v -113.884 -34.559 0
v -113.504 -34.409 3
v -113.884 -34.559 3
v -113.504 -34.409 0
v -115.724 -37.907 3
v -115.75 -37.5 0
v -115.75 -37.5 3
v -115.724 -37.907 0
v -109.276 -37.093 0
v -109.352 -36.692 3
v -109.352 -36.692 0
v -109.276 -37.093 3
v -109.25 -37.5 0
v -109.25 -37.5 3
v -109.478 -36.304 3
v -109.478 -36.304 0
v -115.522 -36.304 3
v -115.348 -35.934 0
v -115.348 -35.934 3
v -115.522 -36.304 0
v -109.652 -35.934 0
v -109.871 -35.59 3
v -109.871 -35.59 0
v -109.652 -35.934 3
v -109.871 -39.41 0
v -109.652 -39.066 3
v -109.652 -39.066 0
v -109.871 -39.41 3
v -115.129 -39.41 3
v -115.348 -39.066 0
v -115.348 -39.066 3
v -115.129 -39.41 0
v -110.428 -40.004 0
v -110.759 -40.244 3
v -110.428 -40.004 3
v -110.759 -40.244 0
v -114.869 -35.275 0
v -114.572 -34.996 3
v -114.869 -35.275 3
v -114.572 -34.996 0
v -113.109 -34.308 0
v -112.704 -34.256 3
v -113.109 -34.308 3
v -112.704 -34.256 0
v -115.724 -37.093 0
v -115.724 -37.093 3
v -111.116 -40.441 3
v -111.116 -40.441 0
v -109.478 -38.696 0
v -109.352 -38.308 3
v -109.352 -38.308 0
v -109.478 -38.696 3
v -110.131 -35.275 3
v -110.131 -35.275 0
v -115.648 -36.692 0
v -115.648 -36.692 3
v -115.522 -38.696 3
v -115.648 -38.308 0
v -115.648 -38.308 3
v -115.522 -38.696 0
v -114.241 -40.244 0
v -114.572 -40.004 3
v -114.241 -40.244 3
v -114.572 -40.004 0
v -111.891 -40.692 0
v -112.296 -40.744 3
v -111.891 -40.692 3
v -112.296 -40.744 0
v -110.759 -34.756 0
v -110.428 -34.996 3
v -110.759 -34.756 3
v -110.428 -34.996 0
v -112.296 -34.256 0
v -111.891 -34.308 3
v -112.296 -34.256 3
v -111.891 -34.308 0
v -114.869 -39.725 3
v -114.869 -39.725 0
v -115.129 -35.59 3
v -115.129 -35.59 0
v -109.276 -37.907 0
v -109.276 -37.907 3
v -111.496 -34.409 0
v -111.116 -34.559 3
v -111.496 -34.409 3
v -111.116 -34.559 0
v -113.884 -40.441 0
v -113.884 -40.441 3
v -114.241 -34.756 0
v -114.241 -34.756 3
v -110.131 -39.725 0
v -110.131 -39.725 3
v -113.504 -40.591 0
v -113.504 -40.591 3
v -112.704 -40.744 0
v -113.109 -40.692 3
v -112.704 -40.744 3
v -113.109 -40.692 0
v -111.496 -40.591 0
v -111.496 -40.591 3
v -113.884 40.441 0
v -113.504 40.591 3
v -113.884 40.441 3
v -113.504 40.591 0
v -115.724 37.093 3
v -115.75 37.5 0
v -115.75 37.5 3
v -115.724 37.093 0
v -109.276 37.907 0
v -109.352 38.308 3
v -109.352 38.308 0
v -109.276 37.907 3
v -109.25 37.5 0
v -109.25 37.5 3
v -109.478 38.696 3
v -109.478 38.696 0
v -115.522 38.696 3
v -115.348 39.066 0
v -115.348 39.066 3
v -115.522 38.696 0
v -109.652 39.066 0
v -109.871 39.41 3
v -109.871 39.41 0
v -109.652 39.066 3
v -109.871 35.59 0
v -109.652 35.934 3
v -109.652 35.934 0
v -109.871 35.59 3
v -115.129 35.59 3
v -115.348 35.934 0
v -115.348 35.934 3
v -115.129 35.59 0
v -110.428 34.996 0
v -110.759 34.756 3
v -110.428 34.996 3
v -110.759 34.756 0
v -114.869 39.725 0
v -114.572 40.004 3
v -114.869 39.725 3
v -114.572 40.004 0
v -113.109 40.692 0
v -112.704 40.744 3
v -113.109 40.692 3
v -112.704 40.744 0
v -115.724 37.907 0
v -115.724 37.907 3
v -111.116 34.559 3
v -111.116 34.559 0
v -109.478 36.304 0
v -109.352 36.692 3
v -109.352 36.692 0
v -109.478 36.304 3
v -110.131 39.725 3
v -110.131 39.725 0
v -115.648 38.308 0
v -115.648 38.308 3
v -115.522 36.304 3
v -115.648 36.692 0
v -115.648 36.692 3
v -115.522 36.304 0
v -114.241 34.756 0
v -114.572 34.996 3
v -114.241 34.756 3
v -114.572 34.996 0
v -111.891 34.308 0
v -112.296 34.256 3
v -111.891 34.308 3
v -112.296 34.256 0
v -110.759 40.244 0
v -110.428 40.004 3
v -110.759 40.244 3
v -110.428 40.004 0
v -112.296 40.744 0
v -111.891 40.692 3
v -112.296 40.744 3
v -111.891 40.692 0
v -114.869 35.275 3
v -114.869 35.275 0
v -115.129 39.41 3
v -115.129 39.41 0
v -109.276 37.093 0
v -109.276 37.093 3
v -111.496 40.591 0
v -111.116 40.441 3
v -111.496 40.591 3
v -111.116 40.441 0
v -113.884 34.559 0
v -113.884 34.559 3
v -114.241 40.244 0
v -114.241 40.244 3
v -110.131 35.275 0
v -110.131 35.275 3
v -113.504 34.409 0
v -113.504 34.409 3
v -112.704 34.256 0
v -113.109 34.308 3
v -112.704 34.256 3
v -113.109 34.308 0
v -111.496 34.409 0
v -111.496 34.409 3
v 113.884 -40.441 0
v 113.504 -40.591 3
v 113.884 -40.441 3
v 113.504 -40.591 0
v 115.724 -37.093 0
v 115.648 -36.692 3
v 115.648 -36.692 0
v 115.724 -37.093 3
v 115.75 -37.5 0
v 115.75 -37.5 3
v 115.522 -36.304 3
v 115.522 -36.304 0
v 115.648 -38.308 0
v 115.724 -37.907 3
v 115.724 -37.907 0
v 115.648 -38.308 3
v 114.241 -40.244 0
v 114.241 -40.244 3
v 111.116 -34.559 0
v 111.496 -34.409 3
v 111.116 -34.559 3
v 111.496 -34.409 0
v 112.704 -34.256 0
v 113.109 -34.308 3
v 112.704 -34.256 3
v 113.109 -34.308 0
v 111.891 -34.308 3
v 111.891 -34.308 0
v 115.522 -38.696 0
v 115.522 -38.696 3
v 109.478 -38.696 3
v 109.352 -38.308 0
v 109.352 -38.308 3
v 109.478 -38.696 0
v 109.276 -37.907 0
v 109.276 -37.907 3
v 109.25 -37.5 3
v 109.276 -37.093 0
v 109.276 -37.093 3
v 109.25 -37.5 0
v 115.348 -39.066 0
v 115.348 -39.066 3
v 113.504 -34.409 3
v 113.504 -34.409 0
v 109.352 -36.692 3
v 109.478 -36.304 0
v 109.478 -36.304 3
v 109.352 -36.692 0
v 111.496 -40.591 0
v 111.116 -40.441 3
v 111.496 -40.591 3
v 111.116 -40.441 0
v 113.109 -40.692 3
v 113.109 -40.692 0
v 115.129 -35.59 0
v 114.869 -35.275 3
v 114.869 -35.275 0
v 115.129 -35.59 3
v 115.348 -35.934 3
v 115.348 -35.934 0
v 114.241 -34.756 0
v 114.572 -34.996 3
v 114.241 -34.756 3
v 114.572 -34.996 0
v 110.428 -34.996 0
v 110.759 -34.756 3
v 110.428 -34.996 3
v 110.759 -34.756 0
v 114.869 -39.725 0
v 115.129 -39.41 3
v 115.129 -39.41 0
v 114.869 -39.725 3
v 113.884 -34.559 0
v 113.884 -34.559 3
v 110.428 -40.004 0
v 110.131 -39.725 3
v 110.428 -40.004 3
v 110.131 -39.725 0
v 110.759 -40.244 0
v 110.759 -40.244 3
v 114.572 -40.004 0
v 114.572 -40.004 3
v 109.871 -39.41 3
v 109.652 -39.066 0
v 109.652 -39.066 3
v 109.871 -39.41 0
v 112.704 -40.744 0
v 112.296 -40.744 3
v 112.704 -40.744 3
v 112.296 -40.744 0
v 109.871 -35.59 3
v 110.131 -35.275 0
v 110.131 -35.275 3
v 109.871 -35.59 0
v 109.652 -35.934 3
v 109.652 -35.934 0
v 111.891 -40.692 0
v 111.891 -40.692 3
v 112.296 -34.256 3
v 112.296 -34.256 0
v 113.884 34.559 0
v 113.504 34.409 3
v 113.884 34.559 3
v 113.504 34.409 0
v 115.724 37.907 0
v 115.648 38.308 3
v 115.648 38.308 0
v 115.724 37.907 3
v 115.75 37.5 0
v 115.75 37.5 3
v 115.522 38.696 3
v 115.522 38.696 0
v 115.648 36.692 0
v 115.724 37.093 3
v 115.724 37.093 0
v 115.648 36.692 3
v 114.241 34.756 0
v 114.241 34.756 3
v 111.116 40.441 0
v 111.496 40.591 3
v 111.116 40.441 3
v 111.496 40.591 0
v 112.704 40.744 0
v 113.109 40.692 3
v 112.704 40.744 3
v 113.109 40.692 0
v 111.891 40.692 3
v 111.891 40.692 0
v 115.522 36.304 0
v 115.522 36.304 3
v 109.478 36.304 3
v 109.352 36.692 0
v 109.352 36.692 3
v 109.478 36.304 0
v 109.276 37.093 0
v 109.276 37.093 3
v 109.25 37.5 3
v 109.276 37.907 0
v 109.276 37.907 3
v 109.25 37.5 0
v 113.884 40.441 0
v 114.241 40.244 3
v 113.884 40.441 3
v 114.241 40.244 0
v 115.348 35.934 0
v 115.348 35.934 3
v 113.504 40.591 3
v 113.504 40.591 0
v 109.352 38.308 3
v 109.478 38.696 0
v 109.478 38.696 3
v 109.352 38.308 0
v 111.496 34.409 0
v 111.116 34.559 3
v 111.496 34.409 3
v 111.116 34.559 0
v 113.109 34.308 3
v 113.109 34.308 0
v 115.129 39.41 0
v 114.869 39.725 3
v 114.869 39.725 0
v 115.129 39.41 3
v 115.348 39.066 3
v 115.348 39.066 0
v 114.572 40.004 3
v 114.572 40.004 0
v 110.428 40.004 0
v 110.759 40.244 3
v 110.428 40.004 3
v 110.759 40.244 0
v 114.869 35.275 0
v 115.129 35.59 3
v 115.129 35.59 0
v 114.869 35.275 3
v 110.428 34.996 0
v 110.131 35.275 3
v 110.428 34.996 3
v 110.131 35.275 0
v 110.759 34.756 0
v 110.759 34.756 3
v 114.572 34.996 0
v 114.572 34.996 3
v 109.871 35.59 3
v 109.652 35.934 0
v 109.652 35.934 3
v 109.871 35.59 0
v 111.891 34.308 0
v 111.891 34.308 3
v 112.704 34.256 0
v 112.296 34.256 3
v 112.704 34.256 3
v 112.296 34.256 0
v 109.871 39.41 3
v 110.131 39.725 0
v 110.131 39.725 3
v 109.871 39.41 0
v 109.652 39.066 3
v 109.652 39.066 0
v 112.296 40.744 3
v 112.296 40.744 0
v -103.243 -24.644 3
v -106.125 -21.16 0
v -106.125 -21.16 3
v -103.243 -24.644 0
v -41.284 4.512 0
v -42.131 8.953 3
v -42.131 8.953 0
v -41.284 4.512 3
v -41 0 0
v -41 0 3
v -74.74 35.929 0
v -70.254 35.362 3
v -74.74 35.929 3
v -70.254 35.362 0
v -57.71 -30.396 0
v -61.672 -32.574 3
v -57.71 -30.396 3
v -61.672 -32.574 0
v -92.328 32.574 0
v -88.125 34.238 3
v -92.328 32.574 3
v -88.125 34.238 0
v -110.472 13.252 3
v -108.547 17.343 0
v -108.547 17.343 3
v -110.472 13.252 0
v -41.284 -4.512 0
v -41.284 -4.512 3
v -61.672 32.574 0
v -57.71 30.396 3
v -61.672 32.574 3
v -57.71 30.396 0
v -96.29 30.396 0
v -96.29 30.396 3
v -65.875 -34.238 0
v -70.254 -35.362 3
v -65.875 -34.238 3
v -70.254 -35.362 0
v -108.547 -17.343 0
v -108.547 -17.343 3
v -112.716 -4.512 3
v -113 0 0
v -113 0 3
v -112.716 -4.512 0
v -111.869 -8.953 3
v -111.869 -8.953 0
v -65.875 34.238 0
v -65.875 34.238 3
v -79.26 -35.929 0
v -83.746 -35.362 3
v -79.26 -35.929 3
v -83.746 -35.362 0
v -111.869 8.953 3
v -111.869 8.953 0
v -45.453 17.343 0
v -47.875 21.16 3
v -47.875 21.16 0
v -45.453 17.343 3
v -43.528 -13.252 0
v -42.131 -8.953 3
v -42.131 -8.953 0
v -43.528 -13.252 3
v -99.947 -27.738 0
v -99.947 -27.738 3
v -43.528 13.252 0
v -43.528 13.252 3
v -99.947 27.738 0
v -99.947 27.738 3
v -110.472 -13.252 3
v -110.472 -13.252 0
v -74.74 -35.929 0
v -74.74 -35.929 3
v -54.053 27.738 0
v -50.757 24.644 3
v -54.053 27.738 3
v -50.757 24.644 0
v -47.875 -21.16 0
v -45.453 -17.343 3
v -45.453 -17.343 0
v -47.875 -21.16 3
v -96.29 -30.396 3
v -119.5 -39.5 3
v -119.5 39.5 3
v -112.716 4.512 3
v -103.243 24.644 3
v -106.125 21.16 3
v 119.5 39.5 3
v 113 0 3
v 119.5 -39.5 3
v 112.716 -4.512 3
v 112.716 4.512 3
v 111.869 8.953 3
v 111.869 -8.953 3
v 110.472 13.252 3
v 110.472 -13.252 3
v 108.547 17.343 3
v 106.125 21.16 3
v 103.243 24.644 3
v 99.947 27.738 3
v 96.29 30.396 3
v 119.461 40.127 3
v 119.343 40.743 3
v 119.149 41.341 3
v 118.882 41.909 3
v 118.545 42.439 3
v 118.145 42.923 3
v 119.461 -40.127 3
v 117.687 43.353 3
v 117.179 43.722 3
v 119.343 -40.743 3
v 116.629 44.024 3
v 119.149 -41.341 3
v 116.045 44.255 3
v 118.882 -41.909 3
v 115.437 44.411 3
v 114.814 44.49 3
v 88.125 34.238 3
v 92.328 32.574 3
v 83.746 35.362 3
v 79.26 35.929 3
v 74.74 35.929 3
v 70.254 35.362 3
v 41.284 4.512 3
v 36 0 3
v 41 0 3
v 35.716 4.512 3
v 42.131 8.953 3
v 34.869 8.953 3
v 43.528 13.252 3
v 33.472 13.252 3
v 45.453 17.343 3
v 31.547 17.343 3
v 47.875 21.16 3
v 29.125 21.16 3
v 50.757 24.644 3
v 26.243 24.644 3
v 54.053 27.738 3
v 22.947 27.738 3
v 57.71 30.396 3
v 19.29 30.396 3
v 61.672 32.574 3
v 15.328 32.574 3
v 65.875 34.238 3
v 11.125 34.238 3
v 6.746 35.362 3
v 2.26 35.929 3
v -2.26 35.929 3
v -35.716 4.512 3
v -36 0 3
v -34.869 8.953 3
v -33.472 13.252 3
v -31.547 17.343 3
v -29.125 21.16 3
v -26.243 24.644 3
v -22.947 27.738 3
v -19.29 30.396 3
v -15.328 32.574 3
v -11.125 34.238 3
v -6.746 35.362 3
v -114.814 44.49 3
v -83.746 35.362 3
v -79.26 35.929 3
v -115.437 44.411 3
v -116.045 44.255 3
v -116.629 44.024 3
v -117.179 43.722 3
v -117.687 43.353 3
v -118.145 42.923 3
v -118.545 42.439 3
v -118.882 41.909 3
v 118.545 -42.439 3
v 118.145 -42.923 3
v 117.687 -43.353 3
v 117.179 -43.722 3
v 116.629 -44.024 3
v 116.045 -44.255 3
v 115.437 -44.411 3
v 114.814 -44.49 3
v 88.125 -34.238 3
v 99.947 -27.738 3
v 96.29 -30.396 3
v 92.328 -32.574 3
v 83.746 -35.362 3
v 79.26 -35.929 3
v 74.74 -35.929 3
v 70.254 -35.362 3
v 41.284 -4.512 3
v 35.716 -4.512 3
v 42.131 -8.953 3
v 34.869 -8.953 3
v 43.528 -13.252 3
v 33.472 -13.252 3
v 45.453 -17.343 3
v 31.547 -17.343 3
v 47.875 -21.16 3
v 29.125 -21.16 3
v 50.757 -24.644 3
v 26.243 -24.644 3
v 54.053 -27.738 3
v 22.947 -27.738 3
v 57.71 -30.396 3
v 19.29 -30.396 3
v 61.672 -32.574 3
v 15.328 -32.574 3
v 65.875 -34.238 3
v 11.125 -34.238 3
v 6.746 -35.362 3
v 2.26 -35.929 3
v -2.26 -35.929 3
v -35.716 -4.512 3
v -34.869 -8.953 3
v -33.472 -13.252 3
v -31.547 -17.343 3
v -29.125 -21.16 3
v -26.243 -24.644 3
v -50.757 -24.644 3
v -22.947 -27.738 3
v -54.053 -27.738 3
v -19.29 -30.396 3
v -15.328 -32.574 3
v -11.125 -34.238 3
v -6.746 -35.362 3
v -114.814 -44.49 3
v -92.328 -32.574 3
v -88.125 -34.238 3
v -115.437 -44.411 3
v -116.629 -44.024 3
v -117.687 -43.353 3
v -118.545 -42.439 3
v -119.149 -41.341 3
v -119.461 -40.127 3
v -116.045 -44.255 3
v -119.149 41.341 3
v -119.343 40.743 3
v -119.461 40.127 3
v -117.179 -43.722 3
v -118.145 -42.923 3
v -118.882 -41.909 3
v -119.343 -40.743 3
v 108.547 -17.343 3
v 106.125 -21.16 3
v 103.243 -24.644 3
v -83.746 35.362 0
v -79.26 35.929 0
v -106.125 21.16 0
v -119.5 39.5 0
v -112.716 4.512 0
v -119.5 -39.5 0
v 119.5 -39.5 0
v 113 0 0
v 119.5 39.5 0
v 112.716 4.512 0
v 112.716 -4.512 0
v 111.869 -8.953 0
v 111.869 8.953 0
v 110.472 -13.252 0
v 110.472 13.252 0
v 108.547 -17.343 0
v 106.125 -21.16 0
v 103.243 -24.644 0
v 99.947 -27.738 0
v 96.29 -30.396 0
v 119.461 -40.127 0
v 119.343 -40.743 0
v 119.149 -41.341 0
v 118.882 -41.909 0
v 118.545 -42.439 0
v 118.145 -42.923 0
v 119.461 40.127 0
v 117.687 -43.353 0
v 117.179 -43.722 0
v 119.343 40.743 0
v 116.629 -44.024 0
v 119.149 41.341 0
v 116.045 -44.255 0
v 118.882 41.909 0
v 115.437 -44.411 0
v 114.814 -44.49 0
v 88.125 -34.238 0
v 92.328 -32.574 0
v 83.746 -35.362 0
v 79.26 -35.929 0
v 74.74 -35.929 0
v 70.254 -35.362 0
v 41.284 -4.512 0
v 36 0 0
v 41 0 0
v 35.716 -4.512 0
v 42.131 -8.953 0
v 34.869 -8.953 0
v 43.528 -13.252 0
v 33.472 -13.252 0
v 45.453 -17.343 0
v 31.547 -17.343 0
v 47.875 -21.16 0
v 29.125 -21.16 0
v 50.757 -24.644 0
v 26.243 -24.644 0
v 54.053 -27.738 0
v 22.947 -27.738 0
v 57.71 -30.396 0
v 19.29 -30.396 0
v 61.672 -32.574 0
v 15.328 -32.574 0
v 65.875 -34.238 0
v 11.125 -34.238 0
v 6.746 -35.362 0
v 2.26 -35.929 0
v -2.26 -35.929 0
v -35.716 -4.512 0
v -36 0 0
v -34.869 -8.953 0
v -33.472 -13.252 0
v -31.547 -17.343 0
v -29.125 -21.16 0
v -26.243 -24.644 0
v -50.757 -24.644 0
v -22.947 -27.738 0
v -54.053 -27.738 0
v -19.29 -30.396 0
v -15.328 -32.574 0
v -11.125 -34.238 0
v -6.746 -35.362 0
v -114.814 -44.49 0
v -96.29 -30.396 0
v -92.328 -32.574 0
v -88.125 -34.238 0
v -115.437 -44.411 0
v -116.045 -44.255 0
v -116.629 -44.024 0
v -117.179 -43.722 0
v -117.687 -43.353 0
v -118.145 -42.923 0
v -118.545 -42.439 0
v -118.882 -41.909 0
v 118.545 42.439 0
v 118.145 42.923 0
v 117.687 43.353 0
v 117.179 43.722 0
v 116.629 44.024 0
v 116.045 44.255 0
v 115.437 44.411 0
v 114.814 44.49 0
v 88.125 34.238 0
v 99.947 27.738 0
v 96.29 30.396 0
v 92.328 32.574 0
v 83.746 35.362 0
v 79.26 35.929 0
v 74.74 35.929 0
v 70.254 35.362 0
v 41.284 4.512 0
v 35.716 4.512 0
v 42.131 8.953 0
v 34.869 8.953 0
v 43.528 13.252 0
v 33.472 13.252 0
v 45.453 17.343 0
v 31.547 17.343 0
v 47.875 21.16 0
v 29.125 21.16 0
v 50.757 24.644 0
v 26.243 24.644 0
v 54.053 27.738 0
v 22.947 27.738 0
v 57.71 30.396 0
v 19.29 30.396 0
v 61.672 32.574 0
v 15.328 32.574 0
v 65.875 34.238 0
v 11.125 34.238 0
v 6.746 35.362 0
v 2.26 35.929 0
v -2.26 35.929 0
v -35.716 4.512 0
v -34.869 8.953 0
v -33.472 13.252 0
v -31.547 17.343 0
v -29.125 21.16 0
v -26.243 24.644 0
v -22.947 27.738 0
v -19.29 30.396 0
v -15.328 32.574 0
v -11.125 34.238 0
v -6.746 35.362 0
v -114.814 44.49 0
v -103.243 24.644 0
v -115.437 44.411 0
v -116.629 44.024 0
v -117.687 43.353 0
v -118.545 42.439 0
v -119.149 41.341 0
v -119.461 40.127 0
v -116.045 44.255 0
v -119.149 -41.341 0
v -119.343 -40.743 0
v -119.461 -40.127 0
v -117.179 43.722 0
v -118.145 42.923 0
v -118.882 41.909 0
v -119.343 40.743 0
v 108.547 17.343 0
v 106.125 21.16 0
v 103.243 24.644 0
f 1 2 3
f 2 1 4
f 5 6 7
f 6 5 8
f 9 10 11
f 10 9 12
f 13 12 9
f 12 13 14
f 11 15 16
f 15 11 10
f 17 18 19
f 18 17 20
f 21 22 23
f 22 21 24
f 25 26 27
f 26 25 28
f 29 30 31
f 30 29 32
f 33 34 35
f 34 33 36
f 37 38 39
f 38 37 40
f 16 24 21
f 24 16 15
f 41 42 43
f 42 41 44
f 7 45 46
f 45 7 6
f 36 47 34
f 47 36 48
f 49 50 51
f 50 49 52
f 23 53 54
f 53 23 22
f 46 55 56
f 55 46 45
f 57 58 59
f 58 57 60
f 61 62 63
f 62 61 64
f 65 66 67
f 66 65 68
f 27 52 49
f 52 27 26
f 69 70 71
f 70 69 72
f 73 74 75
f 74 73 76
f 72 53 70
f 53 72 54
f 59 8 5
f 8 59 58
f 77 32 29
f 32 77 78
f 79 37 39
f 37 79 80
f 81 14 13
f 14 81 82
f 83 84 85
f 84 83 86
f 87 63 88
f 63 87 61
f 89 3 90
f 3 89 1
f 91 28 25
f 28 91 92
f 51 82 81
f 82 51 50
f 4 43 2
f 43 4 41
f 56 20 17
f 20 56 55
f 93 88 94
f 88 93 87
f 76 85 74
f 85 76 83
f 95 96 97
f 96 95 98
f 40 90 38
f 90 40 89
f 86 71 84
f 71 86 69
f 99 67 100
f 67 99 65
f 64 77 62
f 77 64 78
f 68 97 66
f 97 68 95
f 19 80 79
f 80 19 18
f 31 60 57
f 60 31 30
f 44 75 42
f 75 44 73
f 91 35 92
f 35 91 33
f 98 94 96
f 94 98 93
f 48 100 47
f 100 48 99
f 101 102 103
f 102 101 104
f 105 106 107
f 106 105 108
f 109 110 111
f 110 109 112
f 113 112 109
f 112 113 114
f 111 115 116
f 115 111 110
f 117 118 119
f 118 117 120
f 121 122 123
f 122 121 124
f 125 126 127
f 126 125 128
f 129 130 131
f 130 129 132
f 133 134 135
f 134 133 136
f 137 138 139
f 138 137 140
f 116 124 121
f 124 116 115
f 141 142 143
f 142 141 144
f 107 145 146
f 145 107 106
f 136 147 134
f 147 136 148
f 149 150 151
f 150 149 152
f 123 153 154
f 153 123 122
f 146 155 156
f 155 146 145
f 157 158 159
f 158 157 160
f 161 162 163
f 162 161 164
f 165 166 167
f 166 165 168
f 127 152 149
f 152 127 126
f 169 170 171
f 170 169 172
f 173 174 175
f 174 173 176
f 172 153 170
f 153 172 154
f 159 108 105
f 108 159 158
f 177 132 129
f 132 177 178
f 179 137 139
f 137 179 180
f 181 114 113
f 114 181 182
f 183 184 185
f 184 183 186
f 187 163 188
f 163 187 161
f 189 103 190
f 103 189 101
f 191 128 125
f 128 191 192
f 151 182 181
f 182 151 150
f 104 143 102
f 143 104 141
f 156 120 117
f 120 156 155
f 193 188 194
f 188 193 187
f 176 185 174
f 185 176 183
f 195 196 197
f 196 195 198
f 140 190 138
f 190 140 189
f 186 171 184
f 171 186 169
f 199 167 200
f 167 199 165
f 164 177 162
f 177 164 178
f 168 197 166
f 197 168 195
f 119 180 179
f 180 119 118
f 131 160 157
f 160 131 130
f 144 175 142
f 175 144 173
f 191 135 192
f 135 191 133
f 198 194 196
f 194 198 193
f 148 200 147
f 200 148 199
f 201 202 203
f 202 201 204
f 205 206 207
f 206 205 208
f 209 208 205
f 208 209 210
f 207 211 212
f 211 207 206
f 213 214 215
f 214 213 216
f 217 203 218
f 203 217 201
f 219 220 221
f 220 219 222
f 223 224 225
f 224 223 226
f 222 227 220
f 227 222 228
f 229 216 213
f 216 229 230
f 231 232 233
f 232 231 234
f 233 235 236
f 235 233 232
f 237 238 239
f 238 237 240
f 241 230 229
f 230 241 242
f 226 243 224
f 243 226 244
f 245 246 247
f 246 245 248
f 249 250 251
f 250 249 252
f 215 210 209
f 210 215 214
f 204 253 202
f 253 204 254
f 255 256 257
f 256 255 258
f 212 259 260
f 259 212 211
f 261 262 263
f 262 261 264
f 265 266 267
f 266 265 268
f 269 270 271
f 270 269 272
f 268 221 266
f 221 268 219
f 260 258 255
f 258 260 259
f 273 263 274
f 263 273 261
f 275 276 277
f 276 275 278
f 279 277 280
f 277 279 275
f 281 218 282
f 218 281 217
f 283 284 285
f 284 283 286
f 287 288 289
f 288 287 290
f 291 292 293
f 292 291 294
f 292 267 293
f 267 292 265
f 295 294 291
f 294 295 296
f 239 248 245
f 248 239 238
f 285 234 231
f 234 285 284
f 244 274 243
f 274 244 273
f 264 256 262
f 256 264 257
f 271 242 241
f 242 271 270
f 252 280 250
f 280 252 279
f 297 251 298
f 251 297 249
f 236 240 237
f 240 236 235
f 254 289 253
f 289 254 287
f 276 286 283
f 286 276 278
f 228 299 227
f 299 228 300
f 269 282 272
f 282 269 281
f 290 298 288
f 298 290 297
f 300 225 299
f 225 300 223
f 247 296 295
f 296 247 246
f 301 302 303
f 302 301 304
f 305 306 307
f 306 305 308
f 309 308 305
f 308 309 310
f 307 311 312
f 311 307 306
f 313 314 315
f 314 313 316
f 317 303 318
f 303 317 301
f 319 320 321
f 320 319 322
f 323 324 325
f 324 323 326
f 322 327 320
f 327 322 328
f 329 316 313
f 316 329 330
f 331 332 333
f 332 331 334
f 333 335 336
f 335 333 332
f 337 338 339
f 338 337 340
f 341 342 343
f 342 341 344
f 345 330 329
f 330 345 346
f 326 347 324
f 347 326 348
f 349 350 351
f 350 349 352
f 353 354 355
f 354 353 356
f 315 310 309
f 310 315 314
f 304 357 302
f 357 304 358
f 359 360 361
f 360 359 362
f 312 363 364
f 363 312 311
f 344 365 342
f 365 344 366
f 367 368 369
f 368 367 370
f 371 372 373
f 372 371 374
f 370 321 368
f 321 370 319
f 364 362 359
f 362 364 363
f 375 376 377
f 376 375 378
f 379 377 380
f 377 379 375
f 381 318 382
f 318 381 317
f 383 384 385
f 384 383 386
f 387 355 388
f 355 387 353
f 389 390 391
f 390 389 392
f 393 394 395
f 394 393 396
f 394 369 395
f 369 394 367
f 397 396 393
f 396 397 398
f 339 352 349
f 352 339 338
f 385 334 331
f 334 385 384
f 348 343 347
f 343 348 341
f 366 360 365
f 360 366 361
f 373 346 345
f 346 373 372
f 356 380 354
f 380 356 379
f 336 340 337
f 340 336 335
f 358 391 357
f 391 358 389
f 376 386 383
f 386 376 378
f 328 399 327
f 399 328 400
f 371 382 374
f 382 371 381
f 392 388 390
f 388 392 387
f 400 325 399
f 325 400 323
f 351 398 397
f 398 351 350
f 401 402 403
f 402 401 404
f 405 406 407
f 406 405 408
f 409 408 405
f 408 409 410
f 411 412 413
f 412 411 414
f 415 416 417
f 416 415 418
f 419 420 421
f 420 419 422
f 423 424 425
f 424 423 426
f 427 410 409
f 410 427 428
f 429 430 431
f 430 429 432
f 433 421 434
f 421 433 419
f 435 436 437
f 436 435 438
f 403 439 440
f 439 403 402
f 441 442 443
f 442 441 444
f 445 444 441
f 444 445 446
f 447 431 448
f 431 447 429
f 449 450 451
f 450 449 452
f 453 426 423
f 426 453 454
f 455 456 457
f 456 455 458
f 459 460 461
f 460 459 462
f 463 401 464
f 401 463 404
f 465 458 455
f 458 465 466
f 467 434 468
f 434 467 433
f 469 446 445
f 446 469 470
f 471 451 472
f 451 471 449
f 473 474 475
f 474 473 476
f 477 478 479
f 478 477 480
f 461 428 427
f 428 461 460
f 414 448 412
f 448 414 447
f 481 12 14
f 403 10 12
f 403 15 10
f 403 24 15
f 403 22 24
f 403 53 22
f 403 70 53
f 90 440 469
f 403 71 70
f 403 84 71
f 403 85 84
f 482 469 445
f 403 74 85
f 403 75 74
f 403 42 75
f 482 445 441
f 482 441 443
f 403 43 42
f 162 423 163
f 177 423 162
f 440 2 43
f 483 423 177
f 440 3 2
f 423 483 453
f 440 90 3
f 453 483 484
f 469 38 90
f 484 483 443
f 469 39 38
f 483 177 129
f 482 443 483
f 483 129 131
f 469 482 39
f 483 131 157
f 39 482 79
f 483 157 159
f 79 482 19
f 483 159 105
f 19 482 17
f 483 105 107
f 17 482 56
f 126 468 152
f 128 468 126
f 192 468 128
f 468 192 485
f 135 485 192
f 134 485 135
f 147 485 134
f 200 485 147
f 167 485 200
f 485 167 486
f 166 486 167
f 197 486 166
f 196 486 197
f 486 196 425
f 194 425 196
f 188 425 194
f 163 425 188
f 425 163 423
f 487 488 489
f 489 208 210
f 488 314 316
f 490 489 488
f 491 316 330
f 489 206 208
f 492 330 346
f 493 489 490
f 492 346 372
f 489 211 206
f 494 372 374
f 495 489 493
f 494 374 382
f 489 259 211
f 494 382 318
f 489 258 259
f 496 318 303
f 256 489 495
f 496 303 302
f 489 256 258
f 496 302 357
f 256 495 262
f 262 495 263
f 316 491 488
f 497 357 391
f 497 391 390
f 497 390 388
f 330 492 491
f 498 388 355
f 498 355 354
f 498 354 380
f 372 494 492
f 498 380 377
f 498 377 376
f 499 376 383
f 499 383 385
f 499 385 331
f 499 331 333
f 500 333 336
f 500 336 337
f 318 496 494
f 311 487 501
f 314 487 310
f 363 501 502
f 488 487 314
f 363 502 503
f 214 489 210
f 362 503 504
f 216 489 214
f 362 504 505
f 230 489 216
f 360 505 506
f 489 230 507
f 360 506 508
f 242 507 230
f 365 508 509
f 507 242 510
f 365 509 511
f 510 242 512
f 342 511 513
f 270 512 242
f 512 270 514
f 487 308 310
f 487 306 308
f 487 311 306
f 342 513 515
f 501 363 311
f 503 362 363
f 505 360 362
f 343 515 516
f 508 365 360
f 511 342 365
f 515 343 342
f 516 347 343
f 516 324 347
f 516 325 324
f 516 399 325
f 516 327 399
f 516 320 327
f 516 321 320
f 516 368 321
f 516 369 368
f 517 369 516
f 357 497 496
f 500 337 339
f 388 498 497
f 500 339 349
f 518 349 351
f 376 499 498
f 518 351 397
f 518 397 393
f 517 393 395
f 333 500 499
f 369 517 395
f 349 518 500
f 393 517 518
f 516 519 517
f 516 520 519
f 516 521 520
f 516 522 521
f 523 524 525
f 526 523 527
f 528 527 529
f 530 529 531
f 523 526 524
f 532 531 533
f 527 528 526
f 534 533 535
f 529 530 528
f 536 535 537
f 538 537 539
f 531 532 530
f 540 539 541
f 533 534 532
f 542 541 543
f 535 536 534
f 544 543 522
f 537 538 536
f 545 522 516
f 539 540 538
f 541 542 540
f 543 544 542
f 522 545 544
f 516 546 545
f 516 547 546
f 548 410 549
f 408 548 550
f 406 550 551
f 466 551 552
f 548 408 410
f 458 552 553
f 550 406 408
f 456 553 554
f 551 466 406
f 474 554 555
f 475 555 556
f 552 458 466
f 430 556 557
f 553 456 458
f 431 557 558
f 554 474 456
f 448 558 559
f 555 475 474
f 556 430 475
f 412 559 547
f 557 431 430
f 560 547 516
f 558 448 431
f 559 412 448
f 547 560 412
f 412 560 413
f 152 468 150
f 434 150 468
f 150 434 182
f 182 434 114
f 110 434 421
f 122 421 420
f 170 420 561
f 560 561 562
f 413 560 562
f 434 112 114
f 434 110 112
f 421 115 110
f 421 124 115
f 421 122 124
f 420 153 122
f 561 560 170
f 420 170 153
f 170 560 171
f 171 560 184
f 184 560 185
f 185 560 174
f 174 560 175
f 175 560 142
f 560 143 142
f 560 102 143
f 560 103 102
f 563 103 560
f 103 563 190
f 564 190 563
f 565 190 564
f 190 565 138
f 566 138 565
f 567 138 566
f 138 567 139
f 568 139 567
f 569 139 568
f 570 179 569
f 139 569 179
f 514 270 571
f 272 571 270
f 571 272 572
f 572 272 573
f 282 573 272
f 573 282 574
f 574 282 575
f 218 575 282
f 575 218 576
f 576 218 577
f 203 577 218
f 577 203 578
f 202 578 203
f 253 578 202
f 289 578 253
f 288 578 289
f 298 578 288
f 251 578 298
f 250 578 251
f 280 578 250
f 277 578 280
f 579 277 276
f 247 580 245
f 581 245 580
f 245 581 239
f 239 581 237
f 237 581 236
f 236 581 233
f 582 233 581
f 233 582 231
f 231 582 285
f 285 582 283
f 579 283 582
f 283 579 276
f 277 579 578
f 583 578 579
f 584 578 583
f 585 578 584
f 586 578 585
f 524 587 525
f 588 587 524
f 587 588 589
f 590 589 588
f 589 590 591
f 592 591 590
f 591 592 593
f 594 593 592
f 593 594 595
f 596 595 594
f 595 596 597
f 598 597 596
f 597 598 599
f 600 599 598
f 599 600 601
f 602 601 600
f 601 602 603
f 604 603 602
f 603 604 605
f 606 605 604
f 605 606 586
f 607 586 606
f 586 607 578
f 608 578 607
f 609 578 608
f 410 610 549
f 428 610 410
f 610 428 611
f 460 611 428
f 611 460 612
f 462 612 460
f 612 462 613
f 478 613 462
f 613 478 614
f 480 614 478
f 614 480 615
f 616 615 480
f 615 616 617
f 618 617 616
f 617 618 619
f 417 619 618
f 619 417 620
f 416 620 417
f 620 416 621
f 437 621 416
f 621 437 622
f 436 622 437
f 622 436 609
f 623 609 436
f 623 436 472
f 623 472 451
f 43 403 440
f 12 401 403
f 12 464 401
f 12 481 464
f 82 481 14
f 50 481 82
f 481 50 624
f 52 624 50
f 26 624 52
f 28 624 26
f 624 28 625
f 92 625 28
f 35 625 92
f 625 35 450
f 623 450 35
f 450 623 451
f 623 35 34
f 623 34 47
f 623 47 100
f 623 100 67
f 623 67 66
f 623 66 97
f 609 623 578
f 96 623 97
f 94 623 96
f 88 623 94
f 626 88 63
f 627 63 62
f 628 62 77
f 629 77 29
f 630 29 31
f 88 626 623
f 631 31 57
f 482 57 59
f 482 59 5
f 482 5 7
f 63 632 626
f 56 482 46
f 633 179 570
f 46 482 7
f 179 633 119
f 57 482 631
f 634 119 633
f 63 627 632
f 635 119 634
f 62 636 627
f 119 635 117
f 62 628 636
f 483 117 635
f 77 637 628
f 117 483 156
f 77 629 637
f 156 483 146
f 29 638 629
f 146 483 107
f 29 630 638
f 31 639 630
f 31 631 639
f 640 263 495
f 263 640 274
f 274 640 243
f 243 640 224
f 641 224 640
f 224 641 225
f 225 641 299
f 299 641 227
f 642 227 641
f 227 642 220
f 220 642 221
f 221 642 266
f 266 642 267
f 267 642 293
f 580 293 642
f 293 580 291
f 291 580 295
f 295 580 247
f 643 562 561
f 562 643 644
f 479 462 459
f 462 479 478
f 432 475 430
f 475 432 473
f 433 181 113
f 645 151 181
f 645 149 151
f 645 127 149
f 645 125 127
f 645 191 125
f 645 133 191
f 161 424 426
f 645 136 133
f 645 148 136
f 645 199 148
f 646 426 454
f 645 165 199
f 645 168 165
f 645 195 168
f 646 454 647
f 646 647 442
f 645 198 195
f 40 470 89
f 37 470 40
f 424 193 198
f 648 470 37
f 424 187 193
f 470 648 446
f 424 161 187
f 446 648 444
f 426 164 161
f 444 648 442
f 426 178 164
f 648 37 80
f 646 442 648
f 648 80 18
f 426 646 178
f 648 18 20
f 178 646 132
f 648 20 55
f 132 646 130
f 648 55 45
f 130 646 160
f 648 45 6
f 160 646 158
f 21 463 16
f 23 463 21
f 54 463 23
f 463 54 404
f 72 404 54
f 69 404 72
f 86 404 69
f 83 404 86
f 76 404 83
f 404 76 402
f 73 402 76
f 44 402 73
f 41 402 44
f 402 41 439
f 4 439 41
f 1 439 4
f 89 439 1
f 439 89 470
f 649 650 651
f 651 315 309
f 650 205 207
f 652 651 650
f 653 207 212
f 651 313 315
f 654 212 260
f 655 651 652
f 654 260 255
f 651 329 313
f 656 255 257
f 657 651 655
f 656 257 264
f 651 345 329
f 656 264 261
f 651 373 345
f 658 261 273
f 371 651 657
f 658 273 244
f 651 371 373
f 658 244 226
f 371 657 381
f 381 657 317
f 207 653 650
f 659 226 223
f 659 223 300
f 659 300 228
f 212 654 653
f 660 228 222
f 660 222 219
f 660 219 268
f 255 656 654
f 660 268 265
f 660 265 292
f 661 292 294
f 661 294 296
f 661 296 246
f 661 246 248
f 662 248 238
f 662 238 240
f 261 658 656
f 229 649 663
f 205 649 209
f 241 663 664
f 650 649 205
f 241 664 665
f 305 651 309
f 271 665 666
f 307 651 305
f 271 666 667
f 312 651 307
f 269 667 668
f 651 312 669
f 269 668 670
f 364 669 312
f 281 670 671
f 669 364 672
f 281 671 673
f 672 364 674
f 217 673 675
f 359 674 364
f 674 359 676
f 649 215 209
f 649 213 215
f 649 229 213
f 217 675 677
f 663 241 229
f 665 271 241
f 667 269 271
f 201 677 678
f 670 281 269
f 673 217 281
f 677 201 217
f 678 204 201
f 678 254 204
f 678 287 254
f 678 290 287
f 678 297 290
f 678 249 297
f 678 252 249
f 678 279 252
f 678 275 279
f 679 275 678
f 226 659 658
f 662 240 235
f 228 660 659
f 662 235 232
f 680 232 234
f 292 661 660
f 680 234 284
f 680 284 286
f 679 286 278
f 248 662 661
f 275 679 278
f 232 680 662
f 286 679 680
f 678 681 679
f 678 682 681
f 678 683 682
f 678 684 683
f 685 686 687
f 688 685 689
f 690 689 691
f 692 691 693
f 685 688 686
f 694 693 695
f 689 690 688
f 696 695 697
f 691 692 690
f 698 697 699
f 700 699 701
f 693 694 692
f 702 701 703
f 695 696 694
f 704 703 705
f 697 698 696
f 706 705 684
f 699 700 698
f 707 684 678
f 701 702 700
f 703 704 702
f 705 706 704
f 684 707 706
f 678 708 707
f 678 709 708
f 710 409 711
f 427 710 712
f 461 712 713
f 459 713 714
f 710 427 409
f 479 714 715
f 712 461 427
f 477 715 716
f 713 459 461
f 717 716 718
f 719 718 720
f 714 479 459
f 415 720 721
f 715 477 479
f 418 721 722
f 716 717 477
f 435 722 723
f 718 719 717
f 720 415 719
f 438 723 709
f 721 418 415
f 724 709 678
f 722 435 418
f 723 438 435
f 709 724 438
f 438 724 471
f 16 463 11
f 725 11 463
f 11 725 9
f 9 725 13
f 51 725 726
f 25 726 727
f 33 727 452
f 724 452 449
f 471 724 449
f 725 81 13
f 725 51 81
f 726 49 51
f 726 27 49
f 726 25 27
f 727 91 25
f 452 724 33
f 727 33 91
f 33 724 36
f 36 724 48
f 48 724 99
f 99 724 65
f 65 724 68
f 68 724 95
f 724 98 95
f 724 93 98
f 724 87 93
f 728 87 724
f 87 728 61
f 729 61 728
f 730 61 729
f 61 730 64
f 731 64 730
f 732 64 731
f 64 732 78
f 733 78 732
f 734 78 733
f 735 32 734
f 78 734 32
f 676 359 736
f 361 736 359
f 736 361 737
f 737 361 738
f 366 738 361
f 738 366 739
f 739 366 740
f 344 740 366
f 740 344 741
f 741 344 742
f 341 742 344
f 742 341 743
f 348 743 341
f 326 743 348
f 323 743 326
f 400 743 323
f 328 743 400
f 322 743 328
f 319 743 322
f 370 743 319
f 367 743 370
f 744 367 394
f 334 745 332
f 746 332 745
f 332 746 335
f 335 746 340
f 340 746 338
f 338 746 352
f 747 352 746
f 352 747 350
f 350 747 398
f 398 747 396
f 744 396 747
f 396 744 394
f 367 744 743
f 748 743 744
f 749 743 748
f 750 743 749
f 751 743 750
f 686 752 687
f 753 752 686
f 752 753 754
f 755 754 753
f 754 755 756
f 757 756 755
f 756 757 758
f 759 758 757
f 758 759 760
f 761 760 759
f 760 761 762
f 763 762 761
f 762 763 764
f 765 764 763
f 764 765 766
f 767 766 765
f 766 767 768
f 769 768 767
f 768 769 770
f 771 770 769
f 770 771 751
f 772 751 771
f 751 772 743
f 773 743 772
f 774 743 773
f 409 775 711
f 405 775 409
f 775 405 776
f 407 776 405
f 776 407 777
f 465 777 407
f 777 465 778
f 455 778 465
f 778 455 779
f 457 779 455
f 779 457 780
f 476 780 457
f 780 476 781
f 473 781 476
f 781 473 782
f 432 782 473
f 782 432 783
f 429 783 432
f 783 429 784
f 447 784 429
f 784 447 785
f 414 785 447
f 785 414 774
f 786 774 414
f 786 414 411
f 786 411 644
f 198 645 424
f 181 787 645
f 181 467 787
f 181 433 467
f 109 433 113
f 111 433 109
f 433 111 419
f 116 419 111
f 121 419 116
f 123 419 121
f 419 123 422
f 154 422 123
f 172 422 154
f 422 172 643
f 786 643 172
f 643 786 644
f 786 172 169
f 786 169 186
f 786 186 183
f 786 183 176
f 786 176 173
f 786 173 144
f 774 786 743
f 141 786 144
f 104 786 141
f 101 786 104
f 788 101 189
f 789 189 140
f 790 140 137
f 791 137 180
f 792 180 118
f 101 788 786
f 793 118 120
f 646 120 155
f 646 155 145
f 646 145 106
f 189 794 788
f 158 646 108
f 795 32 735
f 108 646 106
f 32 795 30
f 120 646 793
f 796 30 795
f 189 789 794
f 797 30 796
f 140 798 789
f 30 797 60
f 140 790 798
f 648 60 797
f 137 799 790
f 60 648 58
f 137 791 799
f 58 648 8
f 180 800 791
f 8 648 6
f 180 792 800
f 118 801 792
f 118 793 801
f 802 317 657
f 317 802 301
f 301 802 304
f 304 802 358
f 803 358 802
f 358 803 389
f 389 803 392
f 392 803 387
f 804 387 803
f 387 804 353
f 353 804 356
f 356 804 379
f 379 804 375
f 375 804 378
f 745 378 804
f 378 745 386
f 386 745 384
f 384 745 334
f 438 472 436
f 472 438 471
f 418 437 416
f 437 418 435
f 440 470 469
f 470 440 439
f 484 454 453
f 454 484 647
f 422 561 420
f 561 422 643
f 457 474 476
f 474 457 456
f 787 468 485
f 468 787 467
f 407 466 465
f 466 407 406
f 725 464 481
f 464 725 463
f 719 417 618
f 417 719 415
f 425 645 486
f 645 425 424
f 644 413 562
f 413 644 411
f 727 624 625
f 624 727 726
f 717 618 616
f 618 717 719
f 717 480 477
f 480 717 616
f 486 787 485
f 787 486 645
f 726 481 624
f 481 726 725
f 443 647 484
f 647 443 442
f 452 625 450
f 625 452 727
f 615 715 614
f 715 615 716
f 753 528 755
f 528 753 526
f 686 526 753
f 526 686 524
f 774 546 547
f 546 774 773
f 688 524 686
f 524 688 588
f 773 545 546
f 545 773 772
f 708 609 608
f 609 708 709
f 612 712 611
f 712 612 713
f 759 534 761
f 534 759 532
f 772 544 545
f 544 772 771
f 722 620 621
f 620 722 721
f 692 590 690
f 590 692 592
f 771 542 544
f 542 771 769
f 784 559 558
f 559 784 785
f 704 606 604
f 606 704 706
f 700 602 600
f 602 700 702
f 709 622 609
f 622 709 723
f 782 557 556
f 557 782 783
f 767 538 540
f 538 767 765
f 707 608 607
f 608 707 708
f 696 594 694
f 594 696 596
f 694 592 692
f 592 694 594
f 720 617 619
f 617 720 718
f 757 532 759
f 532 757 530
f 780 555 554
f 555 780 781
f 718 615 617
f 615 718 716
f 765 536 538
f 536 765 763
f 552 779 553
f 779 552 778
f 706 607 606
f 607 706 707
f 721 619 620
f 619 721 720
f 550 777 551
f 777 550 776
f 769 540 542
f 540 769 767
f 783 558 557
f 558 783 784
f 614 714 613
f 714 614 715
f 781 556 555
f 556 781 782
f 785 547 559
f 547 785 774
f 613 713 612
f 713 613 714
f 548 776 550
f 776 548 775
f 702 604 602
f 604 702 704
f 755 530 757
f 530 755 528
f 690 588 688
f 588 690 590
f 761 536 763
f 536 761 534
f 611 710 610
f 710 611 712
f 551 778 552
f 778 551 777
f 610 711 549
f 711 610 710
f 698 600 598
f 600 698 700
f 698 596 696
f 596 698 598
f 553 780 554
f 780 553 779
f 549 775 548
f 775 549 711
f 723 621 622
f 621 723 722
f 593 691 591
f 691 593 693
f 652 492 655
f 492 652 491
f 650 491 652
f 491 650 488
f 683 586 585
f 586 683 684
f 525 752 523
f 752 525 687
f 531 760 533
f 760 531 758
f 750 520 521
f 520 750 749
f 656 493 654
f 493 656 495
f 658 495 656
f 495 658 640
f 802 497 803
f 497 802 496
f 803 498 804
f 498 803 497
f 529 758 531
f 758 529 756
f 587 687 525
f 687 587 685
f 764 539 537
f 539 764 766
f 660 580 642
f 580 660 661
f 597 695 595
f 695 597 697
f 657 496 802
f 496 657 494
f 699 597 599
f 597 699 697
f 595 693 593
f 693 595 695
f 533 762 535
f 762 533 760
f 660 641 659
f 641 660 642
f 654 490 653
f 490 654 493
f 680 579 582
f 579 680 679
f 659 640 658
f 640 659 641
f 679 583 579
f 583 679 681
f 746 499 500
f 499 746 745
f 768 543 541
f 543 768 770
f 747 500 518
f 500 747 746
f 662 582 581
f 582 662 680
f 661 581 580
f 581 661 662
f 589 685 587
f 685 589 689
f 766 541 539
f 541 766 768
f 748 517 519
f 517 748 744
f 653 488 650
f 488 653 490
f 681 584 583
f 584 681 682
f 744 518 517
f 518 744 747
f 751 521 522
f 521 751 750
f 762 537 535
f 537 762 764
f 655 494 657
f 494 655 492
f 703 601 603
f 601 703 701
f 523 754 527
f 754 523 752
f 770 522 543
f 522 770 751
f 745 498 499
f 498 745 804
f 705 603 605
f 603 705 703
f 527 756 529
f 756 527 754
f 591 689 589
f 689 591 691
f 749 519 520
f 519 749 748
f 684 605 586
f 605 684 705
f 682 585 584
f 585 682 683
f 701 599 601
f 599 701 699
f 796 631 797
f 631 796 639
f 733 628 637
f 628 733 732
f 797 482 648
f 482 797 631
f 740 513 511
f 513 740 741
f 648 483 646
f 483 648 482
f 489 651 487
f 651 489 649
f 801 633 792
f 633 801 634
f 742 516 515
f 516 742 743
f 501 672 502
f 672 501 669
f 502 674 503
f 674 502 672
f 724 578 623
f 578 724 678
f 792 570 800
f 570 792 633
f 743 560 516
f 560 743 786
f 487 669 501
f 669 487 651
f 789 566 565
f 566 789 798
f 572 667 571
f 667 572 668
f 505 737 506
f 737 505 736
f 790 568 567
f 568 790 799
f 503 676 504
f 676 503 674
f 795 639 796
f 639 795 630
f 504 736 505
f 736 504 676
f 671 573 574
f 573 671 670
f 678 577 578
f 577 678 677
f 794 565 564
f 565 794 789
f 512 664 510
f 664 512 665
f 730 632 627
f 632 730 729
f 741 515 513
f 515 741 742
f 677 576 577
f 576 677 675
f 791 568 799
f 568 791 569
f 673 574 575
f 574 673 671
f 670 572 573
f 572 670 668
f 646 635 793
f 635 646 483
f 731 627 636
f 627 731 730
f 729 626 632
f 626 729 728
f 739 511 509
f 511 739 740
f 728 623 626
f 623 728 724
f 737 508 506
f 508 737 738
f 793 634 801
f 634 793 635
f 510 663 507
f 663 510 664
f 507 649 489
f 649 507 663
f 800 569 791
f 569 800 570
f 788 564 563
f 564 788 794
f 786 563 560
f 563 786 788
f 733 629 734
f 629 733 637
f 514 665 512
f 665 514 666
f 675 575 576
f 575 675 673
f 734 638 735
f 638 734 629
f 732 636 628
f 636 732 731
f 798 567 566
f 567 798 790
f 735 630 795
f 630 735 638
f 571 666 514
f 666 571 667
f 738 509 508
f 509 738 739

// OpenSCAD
$fn = 50;

difference() {
	union() {
		hull() {
			translate(v = [-114.5, 39.5, 0]) {
				cylinder(h = 3, r = 5);
			}
			translate(v = [114.5, 39.5, 0]) {
				cylinder(h = 3, r = 5);
			}
			translate(v = [-114.5, -39.5, 0]) {
				cylinder(h = 3, r = 5);
			}
			translate(v = [114.5, -39.5, 0]) {
				cylinder(h = 3, r = 5);
			}
		}
	}
	union() {
		translate(v = [-112.5, -37.5, -100.0]) {
			cylinder(h = 200, r = 3.25);
		}
		translate(v = [-112.5, 37.5, -100.0]) {
			cylinder(h = 200, r = 3.25);
		}
		translate(v = [112.5, -37.5, -100.0]) {
			cylinder(h = 200, r = 3.25);
		}
		translate(v = [112.5, 37.5, -100.0]) {
			cylinder(h = 200, r = 3.25);
		}
		translate(v = [-112.5, -37.5, -100.0]) {
			cylinder(h = 200, r = 1.8);
		}
		translate(v = [-112.5, 37.5, -100.0]) {
			cylinder(h = 200, r = 1.8);
		}
		translate(v = [112.5, -37.5, -100.0]) {
			cylinder(h = 200, r = 1.8);
		}
		translate(v = [112.5, 37.5, -100.0]) {
			cylinder(h = 200, r = 1.8);
		}
		translate(v = [-77.0, 0, 0.0]) {
			cylinder(h = 3, r = 36.0);
		}
		cylinder(h = 3, r = 36.0);
		translate(v = [77.0, 0, 0.0]) {
			cylinder(h = 3, r = 36.0);
		}
	}
}
